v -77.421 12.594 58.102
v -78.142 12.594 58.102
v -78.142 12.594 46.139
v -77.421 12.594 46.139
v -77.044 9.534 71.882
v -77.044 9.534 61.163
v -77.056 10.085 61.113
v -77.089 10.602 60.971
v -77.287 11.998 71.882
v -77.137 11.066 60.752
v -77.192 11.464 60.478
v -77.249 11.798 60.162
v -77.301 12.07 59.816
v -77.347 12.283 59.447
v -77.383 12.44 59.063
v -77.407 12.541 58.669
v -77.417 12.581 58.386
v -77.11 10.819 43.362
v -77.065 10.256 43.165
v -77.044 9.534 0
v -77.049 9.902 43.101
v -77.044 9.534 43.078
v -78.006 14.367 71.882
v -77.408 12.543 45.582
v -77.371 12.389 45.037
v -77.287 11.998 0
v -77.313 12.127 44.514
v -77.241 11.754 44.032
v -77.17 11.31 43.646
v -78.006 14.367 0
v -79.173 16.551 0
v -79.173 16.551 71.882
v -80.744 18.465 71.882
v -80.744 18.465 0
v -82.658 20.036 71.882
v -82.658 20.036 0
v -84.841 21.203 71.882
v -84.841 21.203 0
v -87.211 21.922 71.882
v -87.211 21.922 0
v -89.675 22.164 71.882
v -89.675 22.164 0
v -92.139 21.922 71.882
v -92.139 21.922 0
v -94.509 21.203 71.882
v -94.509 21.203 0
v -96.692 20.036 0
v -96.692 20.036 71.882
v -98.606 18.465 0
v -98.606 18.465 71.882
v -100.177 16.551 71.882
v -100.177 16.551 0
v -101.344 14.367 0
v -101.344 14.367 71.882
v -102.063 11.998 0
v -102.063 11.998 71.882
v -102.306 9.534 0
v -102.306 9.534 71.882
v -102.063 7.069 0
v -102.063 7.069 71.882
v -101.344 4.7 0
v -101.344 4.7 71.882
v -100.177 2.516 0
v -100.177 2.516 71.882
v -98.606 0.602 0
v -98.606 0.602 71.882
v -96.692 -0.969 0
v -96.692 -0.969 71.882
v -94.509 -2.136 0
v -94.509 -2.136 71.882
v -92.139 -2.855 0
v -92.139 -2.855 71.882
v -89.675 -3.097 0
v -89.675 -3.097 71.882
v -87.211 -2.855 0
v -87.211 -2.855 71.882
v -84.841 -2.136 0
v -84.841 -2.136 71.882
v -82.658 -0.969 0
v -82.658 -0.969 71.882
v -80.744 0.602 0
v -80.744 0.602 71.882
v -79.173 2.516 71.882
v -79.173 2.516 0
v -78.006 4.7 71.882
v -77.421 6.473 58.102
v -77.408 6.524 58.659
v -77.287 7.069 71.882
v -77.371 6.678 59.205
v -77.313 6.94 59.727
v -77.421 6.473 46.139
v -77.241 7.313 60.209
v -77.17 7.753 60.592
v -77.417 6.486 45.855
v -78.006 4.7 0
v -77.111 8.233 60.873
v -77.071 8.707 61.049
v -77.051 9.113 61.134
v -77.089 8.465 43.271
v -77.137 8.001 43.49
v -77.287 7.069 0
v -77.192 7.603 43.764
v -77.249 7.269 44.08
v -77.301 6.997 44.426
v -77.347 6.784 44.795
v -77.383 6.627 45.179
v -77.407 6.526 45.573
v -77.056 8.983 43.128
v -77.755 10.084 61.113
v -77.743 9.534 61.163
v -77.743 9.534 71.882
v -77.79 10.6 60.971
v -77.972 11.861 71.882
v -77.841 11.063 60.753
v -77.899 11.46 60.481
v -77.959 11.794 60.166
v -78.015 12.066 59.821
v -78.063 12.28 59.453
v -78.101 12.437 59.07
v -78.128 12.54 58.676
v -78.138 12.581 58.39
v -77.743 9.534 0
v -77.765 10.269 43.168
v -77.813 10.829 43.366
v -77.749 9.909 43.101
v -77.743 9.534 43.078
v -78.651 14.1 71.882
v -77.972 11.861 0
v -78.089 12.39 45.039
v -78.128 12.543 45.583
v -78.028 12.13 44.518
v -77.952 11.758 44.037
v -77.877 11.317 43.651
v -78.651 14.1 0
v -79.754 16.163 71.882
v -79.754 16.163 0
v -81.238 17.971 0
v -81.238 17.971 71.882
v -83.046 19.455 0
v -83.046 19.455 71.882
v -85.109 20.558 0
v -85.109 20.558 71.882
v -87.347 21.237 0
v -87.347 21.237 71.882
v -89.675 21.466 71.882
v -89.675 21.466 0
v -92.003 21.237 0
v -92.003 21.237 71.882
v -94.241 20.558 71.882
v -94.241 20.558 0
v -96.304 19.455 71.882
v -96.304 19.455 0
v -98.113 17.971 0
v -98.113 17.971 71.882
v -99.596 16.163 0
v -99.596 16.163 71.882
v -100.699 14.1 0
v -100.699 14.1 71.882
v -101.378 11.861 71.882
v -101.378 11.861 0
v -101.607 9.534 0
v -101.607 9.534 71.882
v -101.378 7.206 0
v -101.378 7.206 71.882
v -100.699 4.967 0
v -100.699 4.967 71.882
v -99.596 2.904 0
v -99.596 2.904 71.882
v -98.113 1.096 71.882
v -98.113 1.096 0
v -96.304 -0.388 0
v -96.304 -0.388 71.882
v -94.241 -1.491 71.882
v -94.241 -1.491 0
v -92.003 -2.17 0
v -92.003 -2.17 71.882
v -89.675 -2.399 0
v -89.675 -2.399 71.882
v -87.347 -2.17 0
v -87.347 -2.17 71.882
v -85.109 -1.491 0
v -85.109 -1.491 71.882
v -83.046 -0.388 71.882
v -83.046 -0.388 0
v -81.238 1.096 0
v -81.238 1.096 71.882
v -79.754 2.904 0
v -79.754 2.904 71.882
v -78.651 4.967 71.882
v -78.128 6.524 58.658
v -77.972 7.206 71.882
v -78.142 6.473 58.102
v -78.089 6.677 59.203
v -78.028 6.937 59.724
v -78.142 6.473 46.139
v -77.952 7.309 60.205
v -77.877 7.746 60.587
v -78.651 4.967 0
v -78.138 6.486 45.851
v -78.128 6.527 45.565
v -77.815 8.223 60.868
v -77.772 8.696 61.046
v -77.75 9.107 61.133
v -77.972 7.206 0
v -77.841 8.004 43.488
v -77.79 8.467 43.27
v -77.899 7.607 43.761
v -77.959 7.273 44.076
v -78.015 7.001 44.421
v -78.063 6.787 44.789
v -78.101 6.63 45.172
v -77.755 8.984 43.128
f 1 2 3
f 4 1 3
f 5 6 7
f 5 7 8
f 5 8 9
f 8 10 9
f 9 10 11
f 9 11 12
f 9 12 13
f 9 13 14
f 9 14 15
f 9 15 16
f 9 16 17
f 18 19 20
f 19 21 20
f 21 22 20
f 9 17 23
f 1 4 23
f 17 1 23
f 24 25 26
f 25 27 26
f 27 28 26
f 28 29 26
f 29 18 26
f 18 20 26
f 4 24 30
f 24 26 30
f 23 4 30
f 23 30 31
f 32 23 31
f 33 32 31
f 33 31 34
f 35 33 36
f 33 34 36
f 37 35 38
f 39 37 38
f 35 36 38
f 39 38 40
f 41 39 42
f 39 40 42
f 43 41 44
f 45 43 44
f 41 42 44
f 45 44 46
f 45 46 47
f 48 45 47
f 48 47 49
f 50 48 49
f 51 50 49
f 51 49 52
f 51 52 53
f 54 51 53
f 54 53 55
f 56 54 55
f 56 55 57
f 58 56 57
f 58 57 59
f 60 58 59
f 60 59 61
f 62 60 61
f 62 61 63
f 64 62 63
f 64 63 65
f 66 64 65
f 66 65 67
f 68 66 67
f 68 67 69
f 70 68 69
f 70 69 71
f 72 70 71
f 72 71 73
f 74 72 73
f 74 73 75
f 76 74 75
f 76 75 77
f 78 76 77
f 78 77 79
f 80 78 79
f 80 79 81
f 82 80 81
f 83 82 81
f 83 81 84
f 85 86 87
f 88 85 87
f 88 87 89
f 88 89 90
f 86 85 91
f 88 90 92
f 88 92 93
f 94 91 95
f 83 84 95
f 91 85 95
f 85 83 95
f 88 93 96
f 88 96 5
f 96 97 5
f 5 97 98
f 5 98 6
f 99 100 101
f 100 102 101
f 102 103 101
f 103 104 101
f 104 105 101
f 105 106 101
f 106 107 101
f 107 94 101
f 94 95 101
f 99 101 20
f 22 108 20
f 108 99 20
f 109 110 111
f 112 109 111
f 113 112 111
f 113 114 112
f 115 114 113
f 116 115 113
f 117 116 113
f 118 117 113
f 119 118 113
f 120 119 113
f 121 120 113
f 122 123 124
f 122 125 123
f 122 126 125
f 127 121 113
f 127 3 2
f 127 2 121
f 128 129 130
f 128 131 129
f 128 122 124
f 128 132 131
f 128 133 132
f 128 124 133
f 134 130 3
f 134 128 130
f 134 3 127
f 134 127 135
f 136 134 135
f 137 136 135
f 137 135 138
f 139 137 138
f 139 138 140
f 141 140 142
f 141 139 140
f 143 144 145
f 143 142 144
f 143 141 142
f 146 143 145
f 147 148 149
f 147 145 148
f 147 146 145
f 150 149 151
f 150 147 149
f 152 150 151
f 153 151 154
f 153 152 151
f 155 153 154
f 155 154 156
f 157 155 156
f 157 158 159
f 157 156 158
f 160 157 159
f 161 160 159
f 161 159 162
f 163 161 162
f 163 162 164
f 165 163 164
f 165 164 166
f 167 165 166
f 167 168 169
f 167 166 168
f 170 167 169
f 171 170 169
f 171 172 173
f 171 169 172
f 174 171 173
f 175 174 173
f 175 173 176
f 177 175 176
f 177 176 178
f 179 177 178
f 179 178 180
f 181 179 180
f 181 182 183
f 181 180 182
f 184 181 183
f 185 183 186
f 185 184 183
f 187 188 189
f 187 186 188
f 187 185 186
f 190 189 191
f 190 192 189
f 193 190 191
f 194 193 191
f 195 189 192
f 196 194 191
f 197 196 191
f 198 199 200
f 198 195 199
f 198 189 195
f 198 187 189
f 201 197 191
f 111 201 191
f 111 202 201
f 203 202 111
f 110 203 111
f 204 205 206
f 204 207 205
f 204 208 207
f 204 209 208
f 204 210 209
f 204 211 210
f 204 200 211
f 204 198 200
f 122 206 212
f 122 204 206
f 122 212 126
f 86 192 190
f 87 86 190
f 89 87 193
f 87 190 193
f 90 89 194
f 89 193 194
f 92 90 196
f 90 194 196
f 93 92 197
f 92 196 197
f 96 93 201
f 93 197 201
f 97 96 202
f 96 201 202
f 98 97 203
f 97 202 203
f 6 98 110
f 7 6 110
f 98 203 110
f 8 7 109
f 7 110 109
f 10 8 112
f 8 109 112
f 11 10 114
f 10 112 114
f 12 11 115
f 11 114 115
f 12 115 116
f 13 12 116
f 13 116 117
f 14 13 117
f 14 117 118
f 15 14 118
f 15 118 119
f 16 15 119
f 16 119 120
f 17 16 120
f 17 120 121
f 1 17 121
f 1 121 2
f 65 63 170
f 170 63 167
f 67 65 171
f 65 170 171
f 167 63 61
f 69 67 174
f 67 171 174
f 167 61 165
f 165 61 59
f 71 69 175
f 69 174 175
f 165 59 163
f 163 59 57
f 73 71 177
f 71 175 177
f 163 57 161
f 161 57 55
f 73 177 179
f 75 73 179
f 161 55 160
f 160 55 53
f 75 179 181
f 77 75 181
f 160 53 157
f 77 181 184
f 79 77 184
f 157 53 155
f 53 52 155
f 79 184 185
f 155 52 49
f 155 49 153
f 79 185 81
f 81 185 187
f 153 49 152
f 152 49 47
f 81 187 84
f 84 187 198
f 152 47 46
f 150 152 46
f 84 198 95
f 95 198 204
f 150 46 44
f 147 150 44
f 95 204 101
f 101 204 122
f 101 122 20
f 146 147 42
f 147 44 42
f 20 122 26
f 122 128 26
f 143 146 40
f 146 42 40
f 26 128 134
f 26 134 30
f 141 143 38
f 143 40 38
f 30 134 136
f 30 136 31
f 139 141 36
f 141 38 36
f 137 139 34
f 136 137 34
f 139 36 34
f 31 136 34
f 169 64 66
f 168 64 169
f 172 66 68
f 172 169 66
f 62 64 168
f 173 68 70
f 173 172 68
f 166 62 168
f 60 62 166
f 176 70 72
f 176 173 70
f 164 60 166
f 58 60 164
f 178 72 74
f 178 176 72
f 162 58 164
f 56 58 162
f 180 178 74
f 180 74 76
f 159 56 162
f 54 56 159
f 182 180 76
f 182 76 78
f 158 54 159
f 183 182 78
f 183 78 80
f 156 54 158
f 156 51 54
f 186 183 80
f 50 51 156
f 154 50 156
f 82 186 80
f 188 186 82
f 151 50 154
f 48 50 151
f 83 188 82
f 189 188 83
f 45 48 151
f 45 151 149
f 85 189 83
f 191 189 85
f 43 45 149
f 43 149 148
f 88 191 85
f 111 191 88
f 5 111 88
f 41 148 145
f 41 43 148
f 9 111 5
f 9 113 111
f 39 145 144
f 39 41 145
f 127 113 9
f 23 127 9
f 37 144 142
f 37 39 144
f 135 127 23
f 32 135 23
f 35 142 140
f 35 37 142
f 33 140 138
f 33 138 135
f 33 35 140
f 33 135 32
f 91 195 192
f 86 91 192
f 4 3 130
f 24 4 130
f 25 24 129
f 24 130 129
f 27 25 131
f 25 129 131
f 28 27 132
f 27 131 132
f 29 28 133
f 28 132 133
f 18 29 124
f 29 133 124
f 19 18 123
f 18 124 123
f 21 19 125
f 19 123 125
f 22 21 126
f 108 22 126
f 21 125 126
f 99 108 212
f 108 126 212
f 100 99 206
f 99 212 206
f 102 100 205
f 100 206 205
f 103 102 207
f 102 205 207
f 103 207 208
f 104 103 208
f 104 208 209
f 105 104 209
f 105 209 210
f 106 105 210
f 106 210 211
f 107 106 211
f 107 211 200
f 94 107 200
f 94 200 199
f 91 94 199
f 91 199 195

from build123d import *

# Parameters (mm, degrees)
SKETCH1_R           = 12.630912
BOSS_EXTRUDE1_DEPTH = 71.882
SHELL1_T            = -0.6985
CUT_EXTRUDE1_DEPTH  = 71.882


with BuildPart() as part:
    # Sketch1 → Boss-Extrude1 (new body)
    with BuildSketch(Plane.XY):
        with Locations((-89.675021381, 9.53355709)):
            Circle(SKETCH1_R)
    extrude(amount=BOSS_EXTRUDE1_DEPTH)

    # Shell1
    shell1_openings = [part.faces().sort_by_distance(p)[0] for p in [
        (-89.675021381, 9.53355709, 71.882),
        (-89.675021381, 9.53355709, 0),
    ]]
    offset(amount=SHELL1_T, openings=shell1_openings, kind=Kind.INTERSECTION)

    # Sketch4 → Cut-Extrude1 (cut)
    with BuildSketch(Plane(origin=(-89.662, 0, 0), x_dir=(0, 0, -1), z_dir=(1, 0, 0))):
        with BuildLine():
            Line((-58.1025, 12.59425709), (-46.1391, 12.59425709))
            ThreePointArc((-46.1391, 12.59425709), (-43.0784, 9.53355709), (-46.1391, 6.47285709))
            Line((-46.1391, 6.47285709), (-58.1025, 6.47285709))
            ThreePointArc((-58.1025, 6.47285709), (-61.1632, 9.53355709), (-58.1025, 12.59425709))
        make_face()
    extrude(amount=CUT_EXTRUDE1_DEPTH, mode=Mode.SUBTRACT)


solid = part.part
